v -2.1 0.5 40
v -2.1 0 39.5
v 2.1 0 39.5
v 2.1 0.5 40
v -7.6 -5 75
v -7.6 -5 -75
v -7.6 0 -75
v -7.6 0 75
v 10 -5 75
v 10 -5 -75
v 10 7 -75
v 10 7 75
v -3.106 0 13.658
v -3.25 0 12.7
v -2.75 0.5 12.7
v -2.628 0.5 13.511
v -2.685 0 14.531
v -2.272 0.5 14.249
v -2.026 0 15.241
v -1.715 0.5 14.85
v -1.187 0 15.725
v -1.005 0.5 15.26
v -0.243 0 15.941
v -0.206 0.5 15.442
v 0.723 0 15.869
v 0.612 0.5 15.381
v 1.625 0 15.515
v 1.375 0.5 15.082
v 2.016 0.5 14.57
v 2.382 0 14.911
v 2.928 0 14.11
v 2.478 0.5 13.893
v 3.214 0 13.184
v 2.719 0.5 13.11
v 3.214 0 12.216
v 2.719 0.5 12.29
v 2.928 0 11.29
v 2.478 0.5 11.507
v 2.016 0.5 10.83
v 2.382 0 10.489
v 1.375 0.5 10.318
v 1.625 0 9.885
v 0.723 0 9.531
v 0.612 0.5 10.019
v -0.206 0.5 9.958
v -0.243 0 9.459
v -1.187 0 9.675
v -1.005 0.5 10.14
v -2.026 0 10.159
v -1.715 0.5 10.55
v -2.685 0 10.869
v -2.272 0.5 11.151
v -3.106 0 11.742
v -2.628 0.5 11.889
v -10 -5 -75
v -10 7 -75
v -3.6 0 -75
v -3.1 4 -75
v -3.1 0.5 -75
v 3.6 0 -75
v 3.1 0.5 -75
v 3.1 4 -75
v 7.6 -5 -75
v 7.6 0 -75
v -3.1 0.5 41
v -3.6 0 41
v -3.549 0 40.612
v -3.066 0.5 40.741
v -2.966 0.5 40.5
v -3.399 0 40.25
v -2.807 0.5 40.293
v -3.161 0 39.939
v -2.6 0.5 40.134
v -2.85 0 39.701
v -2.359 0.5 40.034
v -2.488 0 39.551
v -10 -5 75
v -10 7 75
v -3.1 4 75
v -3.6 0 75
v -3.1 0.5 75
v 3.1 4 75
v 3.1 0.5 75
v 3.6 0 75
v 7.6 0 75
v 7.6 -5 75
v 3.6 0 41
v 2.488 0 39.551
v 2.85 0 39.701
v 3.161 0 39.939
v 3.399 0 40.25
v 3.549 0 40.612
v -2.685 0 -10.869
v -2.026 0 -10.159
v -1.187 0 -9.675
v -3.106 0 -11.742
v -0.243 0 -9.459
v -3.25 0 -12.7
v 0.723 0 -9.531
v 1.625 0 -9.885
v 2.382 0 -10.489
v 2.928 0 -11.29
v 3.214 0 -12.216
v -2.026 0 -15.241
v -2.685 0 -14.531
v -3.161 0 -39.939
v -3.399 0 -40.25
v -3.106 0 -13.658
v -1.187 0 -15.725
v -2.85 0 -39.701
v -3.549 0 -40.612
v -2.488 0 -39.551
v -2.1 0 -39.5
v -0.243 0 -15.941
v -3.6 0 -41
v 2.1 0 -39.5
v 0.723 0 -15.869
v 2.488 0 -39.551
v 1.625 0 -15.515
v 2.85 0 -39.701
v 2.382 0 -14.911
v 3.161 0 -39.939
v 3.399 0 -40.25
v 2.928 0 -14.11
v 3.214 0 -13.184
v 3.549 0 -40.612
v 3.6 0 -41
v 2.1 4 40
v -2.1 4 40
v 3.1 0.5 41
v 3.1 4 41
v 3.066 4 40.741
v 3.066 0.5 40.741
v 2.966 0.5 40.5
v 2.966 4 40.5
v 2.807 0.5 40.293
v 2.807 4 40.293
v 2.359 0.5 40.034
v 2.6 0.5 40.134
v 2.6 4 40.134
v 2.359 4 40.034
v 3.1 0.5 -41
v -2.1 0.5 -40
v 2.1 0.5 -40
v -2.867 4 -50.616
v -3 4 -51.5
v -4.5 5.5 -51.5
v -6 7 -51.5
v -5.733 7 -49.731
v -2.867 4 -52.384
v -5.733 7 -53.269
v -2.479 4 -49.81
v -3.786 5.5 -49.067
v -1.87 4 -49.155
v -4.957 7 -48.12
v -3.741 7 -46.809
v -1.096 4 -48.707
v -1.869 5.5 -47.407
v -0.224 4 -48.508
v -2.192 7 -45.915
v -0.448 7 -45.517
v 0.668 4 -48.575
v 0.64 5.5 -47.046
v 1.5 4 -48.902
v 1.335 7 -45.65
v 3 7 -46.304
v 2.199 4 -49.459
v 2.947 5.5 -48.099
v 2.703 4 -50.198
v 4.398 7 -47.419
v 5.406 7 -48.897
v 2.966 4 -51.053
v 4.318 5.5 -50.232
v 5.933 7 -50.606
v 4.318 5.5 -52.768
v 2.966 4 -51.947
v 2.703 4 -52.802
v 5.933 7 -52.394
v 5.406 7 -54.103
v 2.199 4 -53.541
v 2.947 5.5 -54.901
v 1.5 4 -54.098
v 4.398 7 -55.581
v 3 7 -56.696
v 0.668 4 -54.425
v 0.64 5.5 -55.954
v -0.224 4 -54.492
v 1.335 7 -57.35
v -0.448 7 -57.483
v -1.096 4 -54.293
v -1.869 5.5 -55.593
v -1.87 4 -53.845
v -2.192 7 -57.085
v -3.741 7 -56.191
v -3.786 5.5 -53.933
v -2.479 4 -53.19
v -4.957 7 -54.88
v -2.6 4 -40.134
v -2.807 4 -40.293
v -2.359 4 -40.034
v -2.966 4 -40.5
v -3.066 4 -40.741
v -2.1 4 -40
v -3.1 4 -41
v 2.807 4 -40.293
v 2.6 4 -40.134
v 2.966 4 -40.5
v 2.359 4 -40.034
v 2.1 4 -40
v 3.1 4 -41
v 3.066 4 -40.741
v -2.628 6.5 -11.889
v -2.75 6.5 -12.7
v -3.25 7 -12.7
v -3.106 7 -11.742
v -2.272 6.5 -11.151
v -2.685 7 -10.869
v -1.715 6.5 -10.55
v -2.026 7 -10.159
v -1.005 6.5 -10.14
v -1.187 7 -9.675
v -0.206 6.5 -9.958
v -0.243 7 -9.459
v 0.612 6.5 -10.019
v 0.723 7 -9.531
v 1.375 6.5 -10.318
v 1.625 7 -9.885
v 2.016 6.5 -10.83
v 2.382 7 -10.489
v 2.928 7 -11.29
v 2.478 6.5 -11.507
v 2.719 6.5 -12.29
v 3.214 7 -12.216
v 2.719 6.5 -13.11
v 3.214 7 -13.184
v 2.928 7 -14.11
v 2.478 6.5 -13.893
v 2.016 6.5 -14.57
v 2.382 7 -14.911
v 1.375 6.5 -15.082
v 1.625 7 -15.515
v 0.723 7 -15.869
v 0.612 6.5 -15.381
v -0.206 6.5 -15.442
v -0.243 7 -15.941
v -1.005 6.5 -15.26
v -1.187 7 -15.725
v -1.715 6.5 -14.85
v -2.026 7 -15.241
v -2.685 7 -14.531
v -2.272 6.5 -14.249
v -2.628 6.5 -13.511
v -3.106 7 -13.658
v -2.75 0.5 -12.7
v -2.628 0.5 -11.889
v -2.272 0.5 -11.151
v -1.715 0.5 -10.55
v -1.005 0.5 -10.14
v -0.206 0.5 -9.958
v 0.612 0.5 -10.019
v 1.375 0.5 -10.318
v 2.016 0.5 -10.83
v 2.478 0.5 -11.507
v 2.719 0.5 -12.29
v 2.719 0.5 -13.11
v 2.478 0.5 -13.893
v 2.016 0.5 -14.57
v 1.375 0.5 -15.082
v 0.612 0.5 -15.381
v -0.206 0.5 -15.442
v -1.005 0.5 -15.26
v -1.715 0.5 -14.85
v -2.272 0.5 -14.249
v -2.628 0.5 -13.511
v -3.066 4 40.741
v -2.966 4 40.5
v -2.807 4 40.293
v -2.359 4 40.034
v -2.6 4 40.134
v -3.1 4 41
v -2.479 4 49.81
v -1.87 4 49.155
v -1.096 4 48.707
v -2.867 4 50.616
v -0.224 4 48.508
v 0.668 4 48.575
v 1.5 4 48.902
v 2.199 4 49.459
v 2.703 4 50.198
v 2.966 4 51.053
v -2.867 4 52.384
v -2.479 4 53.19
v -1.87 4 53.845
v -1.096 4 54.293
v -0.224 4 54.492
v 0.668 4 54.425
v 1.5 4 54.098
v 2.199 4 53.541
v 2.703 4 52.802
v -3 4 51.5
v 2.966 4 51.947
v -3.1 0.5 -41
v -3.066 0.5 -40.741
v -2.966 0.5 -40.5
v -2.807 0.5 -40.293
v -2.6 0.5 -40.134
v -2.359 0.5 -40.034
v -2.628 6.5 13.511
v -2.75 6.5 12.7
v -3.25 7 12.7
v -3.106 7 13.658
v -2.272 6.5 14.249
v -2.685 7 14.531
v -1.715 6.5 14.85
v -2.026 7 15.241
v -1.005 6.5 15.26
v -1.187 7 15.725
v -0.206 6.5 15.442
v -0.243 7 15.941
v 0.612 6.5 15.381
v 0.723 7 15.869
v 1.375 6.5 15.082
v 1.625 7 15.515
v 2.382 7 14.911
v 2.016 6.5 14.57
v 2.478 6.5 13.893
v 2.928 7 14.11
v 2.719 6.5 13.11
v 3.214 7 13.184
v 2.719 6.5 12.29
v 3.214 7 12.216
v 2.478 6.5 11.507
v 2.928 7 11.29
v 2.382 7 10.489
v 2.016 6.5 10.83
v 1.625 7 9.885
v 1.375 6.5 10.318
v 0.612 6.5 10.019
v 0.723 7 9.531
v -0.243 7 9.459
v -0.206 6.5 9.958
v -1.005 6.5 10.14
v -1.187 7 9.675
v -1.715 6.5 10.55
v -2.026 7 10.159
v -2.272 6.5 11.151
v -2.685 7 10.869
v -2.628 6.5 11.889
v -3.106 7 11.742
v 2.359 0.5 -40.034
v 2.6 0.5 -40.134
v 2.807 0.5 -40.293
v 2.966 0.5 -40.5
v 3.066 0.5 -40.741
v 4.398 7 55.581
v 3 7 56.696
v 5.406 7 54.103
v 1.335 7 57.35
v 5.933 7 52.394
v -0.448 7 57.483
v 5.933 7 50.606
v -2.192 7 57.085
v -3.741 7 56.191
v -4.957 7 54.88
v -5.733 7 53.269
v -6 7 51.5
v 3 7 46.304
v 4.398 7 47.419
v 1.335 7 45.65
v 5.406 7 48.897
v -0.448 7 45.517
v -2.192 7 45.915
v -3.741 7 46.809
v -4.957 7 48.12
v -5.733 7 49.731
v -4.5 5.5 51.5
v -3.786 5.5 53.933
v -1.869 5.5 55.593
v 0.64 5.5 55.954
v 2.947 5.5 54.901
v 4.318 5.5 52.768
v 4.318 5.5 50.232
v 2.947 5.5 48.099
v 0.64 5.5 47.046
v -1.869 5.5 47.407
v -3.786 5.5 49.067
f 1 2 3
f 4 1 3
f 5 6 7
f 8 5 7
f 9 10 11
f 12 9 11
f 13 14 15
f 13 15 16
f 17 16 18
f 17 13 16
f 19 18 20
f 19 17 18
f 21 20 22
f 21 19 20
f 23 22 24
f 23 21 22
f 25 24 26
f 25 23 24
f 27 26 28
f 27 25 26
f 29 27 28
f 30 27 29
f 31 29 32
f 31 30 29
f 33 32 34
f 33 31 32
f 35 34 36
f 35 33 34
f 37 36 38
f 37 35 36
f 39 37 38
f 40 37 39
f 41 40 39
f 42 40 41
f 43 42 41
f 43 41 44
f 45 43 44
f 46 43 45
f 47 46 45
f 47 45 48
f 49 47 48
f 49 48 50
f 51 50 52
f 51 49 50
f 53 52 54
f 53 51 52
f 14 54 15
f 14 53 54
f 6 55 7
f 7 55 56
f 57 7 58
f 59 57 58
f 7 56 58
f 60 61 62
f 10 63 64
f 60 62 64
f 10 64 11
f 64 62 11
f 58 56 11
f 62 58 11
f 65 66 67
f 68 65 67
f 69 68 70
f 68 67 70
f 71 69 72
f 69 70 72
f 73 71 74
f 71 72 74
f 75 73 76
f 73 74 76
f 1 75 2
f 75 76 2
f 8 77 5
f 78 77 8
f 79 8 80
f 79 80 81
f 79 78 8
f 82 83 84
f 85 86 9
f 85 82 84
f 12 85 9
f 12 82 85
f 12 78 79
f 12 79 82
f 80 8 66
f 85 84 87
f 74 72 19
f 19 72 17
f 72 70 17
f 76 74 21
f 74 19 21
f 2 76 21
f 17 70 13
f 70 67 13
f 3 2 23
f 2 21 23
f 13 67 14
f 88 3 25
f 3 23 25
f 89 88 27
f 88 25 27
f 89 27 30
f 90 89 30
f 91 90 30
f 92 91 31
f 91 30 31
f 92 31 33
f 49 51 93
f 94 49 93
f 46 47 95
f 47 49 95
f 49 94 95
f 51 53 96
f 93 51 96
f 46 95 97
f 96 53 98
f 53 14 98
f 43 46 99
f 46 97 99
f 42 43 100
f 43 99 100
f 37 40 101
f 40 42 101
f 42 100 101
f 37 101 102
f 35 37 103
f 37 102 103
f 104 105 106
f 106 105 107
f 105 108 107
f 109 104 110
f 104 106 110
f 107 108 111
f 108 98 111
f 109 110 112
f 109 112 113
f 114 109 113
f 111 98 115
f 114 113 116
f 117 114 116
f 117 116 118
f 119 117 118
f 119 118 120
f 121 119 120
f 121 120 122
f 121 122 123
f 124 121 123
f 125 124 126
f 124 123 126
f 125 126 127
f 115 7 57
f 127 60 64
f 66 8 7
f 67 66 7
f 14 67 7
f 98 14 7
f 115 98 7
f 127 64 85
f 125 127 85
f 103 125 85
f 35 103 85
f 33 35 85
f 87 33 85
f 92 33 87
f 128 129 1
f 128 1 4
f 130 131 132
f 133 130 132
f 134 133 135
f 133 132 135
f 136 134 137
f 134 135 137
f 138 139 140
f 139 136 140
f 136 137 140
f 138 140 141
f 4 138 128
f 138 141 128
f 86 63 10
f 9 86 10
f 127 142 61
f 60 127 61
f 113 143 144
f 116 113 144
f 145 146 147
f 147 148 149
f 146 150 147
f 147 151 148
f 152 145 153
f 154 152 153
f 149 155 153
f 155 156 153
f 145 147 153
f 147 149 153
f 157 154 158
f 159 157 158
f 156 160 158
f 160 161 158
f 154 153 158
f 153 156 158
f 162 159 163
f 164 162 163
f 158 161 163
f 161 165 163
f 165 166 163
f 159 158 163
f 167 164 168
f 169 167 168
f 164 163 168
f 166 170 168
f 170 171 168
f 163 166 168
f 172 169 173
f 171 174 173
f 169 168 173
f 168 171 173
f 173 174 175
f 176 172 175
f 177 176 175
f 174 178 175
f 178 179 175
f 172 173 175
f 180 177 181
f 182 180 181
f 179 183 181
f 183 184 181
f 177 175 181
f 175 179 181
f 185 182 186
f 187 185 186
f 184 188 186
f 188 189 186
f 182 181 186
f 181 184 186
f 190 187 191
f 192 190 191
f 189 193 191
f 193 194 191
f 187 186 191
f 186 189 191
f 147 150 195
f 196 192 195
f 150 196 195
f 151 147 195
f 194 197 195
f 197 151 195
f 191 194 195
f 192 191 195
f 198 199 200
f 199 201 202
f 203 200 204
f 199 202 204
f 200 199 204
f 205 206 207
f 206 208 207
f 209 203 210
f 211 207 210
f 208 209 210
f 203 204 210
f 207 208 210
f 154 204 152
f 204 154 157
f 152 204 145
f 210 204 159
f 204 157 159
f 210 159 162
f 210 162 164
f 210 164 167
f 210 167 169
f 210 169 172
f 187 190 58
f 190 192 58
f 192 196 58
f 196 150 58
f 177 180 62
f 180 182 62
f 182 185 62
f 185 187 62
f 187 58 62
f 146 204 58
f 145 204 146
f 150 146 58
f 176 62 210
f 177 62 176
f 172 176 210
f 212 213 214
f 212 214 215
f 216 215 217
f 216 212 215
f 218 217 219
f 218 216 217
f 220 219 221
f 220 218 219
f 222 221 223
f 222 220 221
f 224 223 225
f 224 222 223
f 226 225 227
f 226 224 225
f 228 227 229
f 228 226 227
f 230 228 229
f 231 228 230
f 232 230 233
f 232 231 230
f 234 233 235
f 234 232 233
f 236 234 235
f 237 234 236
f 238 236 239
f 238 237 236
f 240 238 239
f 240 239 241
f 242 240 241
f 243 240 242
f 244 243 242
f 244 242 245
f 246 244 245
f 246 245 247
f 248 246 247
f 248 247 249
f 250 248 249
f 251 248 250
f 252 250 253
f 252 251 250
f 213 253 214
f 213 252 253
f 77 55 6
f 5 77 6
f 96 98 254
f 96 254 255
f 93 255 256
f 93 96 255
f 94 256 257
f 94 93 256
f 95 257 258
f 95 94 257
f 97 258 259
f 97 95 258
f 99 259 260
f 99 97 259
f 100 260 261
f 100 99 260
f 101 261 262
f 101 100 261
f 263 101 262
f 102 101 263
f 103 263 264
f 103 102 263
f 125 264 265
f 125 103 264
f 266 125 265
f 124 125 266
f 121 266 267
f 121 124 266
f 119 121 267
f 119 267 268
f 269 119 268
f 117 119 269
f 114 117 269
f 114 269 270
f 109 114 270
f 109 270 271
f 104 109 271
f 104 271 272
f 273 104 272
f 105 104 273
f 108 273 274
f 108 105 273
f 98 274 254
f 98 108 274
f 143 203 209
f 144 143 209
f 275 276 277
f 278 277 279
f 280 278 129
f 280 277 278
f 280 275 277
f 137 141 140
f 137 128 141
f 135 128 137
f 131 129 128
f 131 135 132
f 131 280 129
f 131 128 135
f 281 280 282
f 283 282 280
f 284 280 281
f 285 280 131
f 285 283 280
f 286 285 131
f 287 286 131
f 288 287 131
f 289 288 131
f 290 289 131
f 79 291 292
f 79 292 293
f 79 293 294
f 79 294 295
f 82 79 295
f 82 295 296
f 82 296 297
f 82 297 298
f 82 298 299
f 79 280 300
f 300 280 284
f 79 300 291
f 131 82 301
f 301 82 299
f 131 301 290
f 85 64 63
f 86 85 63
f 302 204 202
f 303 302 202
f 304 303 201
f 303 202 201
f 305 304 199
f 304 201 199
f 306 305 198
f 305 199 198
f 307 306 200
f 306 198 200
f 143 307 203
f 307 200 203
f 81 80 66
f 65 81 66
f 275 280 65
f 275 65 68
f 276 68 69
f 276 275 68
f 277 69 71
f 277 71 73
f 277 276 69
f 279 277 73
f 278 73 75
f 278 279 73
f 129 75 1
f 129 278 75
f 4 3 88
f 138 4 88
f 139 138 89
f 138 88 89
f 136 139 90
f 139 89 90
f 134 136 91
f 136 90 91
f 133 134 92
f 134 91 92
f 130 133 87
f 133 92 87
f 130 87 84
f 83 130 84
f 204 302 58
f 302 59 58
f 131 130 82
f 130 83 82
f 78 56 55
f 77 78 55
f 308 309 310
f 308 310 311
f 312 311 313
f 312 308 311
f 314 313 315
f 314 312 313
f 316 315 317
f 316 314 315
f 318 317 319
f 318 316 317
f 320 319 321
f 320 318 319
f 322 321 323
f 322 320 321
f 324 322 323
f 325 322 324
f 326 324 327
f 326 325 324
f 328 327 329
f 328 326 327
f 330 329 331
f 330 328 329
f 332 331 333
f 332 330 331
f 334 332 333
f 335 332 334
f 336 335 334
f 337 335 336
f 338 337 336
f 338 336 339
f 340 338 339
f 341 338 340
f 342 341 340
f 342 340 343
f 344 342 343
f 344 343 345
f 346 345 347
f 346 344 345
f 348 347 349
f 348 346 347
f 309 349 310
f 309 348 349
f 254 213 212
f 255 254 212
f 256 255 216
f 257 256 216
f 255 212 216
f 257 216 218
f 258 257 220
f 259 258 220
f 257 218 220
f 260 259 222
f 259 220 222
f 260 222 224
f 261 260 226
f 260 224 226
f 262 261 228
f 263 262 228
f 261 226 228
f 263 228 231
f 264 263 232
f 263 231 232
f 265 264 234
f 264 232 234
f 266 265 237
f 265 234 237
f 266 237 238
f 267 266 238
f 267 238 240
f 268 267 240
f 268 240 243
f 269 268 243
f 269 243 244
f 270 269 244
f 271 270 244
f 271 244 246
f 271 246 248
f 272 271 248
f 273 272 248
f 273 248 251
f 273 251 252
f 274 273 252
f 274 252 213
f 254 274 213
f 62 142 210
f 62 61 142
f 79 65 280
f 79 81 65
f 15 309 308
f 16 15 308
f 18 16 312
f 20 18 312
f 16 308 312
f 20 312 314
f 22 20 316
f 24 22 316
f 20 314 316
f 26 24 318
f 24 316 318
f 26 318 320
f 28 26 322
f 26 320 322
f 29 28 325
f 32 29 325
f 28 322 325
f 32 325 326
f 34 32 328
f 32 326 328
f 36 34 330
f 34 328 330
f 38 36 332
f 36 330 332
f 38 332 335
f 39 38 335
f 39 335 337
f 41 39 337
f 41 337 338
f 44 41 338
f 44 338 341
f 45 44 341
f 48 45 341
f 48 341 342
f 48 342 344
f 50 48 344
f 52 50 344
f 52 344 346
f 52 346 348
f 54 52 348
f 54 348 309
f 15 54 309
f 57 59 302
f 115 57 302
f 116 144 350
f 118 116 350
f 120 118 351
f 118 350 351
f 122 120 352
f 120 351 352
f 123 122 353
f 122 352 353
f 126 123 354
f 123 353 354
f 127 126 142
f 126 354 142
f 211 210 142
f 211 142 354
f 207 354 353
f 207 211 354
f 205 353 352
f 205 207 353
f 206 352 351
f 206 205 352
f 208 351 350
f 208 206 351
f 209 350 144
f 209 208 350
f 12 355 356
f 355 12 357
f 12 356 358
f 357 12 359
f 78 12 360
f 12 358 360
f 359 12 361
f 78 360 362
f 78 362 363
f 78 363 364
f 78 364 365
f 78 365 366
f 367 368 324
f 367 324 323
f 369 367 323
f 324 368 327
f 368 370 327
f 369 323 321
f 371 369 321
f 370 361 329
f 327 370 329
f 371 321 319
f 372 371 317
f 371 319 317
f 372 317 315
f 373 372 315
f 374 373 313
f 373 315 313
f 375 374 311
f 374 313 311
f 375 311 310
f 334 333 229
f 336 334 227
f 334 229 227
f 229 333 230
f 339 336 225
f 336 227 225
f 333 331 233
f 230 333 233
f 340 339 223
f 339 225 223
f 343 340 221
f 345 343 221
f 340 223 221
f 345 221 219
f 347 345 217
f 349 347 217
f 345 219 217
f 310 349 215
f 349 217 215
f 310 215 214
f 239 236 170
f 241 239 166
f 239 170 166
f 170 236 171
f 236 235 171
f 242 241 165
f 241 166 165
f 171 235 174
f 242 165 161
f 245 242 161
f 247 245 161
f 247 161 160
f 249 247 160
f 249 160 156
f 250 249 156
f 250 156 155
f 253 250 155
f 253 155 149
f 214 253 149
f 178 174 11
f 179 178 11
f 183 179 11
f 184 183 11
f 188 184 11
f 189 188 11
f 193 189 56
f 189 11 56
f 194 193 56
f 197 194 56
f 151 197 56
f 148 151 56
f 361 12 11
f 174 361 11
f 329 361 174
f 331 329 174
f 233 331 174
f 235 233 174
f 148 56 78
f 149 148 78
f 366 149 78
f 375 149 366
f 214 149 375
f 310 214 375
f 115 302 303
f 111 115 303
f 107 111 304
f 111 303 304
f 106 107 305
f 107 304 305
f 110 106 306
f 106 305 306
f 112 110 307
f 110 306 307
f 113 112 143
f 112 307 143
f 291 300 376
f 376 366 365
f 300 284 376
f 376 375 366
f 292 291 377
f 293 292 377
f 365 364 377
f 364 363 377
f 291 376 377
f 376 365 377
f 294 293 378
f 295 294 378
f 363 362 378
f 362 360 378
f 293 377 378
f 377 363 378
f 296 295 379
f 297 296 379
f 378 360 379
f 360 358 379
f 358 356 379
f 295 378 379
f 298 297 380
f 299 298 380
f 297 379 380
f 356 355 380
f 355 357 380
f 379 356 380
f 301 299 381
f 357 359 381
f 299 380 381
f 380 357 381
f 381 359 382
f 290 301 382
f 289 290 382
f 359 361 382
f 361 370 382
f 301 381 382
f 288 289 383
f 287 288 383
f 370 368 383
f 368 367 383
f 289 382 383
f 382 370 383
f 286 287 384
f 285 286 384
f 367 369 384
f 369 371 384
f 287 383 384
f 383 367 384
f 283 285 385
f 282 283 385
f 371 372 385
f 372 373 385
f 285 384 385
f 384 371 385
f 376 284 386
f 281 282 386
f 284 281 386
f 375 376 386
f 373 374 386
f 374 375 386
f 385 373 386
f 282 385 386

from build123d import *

# Parameters (mm, degrees)
BOSS_EXTRUDE1_DEPTH      = 75
BOSS_EXTRUDE1_DEPTH_BACK = 75
CUT_EXTRUDE1_REACH       = 78.609
SKETCH2_R                = 2.5
SKETCH2_R_2              = 2.75
CHAMFER1_SIZE            = 3.5
SKETCH3_W                = 6.2
SKETCH3_H                = 4
CUT_EXTRUDE2_DEPTH       = 35
CHAMFER3_SIZE            = 0.5
FILLET1_R                = 1
CHAMFER2_SIZE            = 0.5


with BuildPart() as part:
    # Sketch1 → Boss-Extrude1 (new, two sides: drawn at the far end of the back side and taken through both)
    with BuildSketch(Plane.XY.offset(-BOSS_EXTRUDE1_DEPTH_BACK)):
        Polygon((0, 0), (7.6, 0), (7.6, -5), (10, -5), (10, 7), (-10, 7), (-10, -5), (-7.6, -5), (-7.6, 0), align=None)
    extrude(amount=BOSS_EXTRUDE1_DEPTH + BOSS_EXTRUDE1_DEPTH_BACK)

    # Sketch2 → Cut-Extrude1 (cut, up to next)
    with BuildSketch(Plane(origin=(0, 7, 0), x_dir=(1, 0, 0), z_dir=(0, 1, 0)), mode=Mode.PRIVATE) as cut_extrude1_sk1:
        with Locations((0, -51.5)):
            Circle(SKETCH2_R)
    cut_extrude1_tool1 = extrude(cut_extrude1_sk1.sketch, amount=-CUT_EXTRUDE1_REACH, mode=Mode.PRIVATE) & part.part
    # Sketch2 → Cut-Extrude1 (cut, up to next)
    with BuildSketch(Plane(origin=(0, 7, 0), x_dir=(1, 0, 0), z_dir=(0, 1, 0)), mode=Mode.PRIVATE) as cut_extrude1_sk2:
        with Locations((0, 12.7)):
            Circle(SKETCH2_R_2)
    cut_extrude1_tool2 = extrude(cut_extrude1_sk2.sketch, amount=-CUT_EXTRUDE1_REACH, mode=Mode.PRIVATE) & part.part
    # Sketch2 → Cut-Extrude1 (cut, up to next)
    with BuildSketch(Plane(origin=(0, 7, 0), x_dir=(1, 0, 0), z_dir=(0, 1, 0)), mode=Mode.PRIVATE) as cut_extrude1_sk3:
        with Locations((0, -12.7)):
            Circle(SKETCH2_R_2)
    cut_extrude1_tool3 = extrude(cut_extrude1_sk3.sketch, amount=-CUT_EXTRUDE1_REACH, mode=Mode.PRIVATE) & part.part
    # Sketch2 → Cut-Extrude1 (cut, up to next)
    with BuildSketch(Plane(origin=(0, 7, 0), x_dir=(1, 0, 0), z_dir=(0, 1, 0)), mode=Mode.PRIVATE) as cut_extrude1_sk4:
        with Locations((0, 51.5)):
            Circle(SKETCH2_R)
    cut_extrude1_tool4 = extrude(cut_extrude1_sk4.sketch, amount=-CUT_EXTRUDE1_REACH, mode=Mode.PRIVATE) & part.part
    add(cut_extrude1_tool1.solids().sort_by_distance((0, 7, 51.5))[0], mode=Mode.SUBTRACT)
    add(cut_extrude1_tool2.solids().sort_by_distance((0, 7, -12.7))[0], mode=Mode.SUBTRACT)
    add(cut_extrude1_tool3.solids().sort_by_distance((0, 7, 12.7))[0], mode=Mode.SUBTRACT)
    add(cut_extrude1_tool4.solids().sort_by_distance((0, 7, -51.5))[0], mode=Mode.SUBTRACT)

    # Chamfer1
    chamfer1_edges = [part.edges().sort_by_distance(p)[0] for p in [
        (-2.5, 7, 51.5),
        (-2.5, 7, -51.5),
    ]]
    chamfer(chamfer1_edges, length=CHAMFER1_SIZE)

    # Sketch3 → Cut-Extrude2 (cut)
    with BuildSketch(Plane.XY.offset(75)):
        with Locations((0, 2)):
            Rectangle(SKETCH3_W, SKETCH3_H)
    cut_extrude2 = extrude(amount=-CUT_EXTRUDE2_DEPTH, mode=Mode.SUBTRACT)

    # Mirror2: Cut-Extrude2 across plane
    add(cut_extrude2.mirror(Plane.XY), mode=Mode.SUBTRACT)

    # Chamfer3
    chamfer3_edges = [part.edges().sort_by_distance(p)[0] for p in [
        (-2.75, 7, -12.7),
        (-2.75, 7, 12.7),
        (-2.75, 0, -12.7),
        (-2.75, 0, 12.7),
    ]]
    chamfer(chamfer3_edges, length=CHAMFER3_SIZE)

    # Fillet1
    fillet1_edges = [part.edges().sort_by_distance(p)[0] for p in [
        (-3.1, 2, -40),
        (3.1, 2, -40),
        (-3.1, 2, 40),
        (3.1, 2, 40),
    ]]
    fillet(fillet1_edges, radius=FILLET1_R)

    # Chamfer2
    chamfer2_edges = [part.edges().sort_by_distance(p)[0] for p in [
        (-3.1, 0, 58),
        (0, 0, 40),
        (3.1, 0, 58),
        (-3.1, 0, -58),
        (0, 0, -40),
        (3.1, 0, -58),
        (-2.807106781, 0, -40.292893219),
        (2.807106781, 0, -40.292893219),
        (-2.807106781, 0, 40.292893219),
        (2.807106781, 0, 40.292893219),
    ]]
    chamfer(chamfer2_edges, length=CHAMFER2_SIZE)


solid = part.part
